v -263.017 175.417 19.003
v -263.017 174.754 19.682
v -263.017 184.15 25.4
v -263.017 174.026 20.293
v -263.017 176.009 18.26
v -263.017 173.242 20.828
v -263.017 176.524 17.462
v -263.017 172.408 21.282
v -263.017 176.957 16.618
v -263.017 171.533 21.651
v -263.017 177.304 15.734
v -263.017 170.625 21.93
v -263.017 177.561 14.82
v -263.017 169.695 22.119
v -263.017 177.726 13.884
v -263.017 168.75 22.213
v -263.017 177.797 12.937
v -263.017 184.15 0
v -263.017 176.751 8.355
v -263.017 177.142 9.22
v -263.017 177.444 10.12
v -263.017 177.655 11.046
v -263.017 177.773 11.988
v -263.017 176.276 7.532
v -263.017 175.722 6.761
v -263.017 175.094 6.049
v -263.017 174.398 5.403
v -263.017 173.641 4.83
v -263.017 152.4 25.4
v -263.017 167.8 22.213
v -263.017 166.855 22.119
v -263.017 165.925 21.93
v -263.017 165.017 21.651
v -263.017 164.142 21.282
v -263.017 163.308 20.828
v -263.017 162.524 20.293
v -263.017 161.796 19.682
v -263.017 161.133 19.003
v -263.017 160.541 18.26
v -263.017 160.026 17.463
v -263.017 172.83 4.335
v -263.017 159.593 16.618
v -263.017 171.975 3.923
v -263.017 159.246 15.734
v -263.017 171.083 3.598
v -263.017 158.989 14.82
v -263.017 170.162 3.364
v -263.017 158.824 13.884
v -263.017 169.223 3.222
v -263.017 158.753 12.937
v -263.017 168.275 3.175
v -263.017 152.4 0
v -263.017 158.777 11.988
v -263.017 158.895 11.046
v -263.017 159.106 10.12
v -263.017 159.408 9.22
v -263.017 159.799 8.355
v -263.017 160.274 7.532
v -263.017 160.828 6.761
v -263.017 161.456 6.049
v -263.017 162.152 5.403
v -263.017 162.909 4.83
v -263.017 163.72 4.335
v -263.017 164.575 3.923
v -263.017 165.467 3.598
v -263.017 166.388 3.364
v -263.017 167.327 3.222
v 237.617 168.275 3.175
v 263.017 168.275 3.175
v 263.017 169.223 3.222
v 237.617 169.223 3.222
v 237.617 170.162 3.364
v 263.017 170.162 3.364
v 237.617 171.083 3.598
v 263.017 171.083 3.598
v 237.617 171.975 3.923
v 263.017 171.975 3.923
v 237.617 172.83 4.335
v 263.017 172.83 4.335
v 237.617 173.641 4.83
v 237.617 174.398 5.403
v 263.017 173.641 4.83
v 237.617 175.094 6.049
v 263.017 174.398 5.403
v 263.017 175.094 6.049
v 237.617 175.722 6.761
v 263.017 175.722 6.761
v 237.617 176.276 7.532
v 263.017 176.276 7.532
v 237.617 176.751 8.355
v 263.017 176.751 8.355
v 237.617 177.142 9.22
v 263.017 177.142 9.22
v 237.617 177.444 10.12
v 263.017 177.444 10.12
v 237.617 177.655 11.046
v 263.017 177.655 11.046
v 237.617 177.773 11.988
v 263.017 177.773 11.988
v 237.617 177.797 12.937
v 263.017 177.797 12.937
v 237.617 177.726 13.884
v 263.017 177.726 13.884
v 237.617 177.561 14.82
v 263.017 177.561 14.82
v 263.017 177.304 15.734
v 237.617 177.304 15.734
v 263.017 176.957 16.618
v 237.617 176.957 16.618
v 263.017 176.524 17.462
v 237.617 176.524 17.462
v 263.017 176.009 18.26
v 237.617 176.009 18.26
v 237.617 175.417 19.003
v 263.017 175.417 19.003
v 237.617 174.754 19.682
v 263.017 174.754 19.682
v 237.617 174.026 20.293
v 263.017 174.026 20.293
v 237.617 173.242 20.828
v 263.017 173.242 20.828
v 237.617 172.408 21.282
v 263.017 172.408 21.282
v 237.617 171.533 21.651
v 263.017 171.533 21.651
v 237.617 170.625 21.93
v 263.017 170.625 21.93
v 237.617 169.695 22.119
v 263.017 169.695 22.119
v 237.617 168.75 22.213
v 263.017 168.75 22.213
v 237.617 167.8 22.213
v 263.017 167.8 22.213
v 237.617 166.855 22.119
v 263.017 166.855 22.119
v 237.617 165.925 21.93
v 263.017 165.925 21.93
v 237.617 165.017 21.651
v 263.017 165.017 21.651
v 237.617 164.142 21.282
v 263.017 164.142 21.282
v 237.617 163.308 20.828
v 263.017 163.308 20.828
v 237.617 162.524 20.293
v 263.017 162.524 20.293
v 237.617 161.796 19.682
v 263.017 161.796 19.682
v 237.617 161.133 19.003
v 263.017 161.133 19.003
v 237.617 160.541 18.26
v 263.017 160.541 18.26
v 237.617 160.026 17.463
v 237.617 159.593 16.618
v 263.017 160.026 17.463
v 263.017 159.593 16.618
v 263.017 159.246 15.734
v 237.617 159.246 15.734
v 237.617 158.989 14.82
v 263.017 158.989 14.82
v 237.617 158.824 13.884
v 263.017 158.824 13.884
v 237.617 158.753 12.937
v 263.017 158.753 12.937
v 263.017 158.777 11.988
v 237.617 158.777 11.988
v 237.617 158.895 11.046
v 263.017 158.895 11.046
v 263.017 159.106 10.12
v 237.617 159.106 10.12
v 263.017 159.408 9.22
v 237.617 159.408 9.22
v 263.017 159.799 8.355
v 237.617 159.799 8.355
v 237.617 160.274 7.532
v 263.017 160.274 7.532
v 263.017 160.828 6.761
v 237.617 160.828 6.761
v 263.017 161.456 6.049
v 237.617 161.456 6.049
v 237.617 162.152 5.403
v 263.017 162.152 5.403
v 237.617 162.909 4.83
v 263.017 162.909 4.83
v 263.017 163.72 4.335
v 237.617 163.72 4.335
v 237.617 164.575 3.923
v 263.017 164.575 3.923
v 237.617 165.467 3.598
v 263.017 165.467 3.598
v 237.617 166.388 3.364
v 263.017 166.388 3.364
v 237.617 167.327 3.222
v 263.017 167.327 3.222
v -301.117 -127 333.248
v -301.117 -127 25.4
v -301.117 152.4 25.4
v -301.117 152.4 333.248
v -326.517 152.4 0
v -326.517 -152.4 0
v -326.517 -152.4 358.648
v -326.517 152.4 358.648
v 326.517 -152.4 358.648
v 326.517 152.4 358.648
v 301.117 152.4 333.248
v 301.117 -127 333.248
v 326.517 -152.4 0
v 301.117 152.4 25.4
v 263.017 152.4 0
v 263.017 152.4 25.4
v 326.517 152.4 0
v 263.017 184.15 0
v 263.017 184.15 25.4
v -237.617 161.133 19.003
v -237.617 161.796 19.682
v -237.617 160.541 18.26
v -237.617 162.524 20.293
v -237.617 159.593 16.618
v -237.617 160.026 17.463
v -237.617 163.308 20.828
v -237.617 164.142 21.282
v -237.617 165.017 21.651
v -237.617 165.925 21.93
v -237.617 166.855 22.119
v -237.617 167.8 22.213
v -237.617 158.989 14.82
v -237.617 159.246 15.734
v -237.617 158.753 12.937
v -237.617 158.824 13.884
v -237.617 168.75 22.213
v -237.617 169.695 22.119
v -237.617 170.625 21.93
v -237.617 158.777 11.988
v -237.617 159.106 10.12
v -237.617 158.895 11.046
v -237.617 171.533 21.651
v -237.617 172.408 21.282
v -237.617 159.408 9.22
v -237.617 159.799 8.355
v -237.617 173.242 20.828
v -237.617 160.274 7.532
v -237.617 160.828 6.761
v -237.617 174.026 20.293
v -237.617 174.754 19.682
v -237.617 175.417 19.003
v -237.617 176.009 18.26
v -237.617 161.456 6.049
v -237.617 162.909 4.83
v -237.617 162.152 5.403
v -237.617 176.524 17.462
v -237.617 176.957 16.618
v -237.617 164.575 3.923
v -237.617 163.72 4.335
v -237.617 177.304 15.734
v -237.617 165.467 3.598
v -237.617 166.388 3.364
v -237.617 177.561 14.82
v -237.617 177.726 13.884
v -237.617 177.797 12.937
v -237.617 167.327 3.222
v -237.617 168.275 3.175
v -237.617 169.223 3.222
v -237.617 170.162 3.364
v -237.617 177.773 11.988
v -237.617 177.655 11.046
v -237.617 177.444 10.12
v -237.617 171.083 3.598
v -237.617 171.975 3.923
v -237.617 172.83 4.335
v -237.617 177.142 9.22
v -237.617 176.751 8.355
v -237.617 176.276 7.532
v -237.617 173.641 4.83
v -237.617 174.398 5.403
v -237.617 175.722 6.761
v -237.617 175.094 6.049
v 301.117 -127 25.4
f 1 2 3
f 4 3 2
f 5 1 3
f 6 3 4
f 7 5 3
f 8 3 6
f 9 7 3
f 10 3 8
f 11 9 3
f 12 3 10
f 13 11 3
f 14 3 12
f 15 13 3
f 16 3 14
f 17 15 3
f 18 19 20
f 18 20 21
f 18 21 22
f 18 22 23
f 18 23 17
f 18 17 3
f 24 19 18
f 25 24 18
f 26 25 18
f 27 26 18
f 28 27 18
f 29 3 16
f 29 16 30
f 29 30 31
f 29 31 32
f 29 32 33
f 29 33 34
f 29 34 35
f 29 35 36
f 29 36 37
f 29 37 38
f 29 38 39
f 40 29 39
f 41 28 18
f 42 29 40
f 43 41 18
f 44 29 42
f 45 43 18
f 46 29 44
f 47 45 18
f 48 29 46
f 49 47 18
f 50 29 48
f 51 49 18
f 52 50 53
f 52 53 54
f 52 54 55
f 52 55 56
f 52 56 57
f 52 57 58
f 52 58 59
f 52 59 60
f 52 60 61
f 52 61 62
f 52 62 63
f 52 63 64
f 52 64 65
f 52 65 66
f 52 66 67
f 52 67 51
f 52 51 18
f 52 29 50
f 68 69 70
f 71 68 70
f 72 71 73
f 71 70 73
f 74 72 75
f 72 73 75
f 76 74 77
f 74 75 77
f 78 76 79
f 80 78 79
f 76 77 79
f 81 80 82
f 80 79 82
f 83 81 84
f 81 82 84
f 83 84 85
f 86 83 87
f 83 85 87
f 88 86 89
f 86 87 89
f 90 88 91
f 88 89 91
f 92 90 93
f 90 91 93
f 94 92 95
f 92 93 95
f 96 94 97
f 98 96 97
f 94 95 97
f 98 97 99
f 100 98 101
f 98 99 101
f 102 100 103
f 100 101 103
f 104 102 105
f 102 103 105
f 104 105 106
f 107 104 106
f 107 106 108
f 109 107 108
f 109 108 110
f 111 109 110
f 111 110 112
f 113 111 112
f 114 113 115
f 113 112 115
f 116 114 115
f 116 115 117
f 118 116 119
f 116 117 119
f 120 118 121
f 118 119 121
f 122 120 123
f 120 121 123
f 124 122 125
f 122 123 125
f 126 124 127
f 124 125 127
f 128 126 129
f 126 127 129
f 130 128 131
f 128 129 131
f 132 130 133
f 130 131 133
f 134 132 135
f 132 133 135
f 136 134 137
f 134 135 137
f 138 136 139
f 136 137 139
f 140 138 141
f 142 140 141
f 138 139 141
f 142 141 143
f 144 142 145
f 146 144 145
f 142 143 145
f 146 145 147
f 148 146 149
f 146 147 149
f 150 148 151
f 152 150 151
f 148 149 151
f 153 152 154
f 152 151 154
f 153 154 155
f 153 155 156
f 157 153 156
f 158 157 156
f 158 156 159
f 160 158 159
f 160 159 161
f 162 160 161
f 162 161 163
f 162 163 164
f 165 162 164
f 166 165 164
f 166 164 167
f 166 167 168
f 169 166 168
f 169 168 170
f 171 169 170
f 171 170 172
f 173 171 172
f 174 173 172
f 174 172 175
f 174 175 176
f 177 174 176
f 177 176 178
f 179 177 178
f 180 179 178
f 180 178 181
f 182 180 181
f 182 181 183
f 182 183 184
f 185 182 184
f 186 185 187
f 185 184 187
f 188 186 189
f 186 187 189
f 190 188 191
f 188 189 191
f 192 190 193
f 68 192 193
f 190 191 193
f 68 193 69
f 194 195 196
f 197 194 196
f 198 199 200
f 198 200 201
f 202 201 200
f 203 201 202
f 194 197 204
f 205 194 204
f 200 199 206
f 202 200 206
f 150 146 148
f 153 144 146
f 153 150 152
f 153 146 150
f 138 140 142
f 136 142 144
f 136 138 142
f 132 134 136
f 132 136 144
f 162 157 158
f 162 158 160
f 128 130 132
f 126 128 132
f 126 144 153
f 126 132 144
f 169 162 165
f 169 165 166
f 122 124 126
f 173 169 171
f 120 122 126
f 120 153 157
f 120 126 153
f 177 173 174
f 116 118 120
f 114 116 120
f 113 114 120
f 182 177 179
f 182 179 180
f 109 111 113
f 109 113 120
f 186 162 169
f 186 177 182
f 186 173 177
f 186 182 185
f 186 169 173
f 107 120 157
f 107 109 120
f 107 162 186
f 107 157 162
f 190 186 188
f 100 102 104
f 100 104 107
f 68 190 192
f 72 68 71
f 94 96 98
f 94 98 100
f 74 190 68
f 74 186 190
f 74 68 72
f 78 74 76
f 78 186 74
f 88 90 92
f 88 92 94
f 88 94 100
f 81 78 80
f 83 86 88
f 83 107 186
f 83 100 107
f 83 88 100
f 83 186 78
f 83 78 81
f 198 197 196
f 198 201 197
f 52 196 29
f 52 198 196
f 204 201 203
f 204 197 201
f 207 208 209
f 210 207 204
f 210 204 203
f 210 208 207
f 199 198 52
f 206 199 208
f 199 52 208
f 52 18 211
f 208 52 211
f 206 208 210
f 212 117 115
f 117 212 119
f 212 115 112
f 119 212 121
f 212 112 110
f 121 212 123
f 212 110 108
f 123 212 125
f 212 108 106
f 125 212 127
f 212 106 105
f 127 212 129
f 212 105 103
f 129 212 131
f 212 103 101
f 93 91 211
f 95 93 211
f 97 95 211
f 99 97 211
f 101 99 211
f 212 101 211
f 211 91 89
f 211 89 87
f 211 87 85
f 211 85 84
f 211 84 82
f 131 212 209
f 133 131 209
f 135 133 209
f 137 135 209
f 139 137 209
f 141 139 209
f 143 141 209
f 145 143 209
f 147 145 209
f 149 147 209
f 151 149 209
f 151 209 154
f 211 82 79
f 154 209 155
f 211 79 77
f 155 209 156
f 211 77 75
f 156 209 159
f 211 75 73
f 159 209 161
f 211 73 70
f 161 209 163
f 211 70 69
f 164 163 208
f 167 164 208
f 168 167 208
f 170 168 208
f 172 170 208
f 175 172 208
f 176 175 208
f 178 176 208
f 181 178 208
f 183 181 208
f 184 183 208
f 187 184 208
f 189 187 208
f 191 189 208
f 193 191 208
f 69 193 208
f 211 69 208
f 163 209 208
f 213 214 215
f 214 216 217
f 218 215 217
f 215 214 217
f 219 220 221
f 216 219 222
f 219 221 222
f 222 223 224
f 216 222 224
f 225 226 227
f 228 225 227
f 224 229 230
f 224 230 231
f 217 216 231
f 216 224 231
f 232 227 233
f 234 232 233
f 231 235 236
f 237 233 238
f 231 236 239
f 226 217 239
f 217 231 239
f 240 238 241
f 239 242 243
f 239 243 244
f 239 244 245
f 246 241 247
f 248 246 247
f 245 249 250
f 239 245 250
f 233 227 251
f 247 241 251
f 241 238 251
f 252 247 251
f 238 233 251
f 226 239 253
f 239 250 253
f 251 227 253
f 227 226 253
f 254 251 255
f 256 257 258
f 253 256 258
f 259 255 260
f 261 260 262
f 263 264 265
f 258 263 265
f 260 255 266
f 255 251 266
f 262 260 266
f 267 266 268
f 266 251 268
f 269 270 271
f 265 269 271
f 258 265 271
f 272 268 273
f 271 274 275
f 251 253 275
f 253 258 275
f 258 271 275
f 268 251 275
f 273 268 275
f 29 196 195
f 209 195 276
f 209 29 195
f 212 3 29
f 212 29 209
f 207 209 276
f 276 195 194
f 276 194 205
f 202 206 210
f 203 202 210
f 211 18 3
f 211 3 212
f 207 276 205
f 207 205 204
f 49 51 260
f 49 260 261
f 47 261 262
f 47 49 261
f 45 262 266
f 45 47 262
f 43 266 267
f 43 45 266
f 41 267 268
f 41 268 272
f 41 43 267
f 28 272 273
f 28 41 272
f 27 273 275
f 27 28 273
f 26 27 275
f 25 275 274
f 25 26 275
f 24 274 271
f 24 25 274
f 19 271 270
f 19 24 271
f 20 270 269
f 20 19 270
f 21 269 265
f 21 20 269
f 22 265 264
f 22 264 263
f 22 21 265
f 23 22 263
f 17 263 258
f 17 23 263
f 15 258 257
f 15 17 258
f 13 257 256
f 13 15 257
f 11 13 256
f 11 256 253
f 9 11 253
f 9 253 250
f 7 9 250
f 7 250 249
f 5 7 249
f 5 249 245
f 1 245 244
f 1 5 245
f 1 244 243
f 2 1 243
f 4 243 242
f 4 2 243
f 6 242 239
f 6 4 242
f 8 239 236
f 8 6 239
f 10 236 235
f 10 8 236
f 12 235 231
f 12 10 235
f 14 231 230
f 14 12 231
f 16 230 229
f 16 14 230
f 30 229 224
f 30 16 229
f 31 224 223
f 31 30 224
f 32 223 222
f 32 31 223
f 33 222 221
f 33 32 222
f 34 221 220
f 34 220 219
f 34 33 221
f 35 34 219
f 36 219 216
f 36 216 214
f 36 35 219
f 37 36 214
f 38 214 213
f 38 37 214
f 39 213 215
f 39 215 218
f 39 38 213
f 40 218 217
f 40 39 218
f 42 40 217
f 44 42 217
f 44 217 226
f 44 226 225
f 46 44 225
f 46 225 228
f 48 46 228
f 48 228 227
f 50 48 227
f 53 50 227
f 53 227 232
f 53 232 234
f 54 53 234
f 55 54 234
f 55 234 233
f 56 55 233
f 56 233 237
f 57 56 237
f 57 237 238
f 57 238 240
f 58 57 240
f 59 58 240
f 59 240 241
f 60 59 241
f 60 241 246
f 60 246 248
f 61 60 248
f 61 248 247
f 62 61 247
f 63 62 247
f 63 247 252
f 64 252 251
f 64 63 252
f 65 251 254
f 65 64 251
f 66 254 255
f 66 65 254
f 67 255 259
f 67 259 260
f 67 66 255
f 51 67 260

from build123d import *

# Parameters (mm, degrees)
SKETCH1_W           = 653.034
SKETCH1_H           = 304.8
BOSS_EXTRUDE1_DEPTH = 358.648
SHELL1_T            = -25.4
SKETCH2_W           = 526.034
SKETCH2_H           = 25.4
BOSS_EXTRUDE2_DEPTH = 31.75
SKETCH5_R           = 9.525
CUT_EXTRUDE2_DEPTH  = 25.4


with BuildPart() as part:
    # Sketch1 → Boss-Extrude1 (new body)
    with BuildSketch(Plane.XY):
        Rectangle(SKETCH1_W, SKETCH1_H)
    extrude(amount=BOSS_EXTRUDE1_DEPTH)

    # Shell1
    shell1_openings = [part.faces().sort_by_distance(p)[0] for p in [
        (0, 152.4, 179.324),
    ]]
    offset(amount=SHELL1_T, openings=shell1_openings, kind=Kind.INTERSECTION)

    # Sketch2 → Boss-Extrude2 (add)
    with BuildSketch(Plane(origin=(0, 152.4, 0), x_dir=(1, 0, 0), z_dir=(0, 1, 0))):
        with Locations((0, -12.7)):
            Rectangle(SKETCH2_W, SKETCH2_H)
    extrude(amount=BOSS_EXTRUDE2_DEPTH)

    # Sketch5 → Cut-Extrude2 (cut)
    with BuildSketch(Plane(origin=(263.017, 0, 0), x_dir=(0, 0, -1), z_dir=(1, 0, 0))):
        with Locations((-12.7, 168.275)):
            Circle(SKETCH5_R)
    cut_extrude2 = extrude(amount=-CUT_EXTRUDE2_DEPTH, mode=Mode.SUBTRACT)

    # Mirror2: Cut-Extrude2 across plane
    add(cut_extrude2.mirror(Plane(origin=(0, 0, 0), x_dir=(0, 0, 1), z_dir=(1, 0, 0))), mode=Mode.SUBTRACT)


solid = part.part
